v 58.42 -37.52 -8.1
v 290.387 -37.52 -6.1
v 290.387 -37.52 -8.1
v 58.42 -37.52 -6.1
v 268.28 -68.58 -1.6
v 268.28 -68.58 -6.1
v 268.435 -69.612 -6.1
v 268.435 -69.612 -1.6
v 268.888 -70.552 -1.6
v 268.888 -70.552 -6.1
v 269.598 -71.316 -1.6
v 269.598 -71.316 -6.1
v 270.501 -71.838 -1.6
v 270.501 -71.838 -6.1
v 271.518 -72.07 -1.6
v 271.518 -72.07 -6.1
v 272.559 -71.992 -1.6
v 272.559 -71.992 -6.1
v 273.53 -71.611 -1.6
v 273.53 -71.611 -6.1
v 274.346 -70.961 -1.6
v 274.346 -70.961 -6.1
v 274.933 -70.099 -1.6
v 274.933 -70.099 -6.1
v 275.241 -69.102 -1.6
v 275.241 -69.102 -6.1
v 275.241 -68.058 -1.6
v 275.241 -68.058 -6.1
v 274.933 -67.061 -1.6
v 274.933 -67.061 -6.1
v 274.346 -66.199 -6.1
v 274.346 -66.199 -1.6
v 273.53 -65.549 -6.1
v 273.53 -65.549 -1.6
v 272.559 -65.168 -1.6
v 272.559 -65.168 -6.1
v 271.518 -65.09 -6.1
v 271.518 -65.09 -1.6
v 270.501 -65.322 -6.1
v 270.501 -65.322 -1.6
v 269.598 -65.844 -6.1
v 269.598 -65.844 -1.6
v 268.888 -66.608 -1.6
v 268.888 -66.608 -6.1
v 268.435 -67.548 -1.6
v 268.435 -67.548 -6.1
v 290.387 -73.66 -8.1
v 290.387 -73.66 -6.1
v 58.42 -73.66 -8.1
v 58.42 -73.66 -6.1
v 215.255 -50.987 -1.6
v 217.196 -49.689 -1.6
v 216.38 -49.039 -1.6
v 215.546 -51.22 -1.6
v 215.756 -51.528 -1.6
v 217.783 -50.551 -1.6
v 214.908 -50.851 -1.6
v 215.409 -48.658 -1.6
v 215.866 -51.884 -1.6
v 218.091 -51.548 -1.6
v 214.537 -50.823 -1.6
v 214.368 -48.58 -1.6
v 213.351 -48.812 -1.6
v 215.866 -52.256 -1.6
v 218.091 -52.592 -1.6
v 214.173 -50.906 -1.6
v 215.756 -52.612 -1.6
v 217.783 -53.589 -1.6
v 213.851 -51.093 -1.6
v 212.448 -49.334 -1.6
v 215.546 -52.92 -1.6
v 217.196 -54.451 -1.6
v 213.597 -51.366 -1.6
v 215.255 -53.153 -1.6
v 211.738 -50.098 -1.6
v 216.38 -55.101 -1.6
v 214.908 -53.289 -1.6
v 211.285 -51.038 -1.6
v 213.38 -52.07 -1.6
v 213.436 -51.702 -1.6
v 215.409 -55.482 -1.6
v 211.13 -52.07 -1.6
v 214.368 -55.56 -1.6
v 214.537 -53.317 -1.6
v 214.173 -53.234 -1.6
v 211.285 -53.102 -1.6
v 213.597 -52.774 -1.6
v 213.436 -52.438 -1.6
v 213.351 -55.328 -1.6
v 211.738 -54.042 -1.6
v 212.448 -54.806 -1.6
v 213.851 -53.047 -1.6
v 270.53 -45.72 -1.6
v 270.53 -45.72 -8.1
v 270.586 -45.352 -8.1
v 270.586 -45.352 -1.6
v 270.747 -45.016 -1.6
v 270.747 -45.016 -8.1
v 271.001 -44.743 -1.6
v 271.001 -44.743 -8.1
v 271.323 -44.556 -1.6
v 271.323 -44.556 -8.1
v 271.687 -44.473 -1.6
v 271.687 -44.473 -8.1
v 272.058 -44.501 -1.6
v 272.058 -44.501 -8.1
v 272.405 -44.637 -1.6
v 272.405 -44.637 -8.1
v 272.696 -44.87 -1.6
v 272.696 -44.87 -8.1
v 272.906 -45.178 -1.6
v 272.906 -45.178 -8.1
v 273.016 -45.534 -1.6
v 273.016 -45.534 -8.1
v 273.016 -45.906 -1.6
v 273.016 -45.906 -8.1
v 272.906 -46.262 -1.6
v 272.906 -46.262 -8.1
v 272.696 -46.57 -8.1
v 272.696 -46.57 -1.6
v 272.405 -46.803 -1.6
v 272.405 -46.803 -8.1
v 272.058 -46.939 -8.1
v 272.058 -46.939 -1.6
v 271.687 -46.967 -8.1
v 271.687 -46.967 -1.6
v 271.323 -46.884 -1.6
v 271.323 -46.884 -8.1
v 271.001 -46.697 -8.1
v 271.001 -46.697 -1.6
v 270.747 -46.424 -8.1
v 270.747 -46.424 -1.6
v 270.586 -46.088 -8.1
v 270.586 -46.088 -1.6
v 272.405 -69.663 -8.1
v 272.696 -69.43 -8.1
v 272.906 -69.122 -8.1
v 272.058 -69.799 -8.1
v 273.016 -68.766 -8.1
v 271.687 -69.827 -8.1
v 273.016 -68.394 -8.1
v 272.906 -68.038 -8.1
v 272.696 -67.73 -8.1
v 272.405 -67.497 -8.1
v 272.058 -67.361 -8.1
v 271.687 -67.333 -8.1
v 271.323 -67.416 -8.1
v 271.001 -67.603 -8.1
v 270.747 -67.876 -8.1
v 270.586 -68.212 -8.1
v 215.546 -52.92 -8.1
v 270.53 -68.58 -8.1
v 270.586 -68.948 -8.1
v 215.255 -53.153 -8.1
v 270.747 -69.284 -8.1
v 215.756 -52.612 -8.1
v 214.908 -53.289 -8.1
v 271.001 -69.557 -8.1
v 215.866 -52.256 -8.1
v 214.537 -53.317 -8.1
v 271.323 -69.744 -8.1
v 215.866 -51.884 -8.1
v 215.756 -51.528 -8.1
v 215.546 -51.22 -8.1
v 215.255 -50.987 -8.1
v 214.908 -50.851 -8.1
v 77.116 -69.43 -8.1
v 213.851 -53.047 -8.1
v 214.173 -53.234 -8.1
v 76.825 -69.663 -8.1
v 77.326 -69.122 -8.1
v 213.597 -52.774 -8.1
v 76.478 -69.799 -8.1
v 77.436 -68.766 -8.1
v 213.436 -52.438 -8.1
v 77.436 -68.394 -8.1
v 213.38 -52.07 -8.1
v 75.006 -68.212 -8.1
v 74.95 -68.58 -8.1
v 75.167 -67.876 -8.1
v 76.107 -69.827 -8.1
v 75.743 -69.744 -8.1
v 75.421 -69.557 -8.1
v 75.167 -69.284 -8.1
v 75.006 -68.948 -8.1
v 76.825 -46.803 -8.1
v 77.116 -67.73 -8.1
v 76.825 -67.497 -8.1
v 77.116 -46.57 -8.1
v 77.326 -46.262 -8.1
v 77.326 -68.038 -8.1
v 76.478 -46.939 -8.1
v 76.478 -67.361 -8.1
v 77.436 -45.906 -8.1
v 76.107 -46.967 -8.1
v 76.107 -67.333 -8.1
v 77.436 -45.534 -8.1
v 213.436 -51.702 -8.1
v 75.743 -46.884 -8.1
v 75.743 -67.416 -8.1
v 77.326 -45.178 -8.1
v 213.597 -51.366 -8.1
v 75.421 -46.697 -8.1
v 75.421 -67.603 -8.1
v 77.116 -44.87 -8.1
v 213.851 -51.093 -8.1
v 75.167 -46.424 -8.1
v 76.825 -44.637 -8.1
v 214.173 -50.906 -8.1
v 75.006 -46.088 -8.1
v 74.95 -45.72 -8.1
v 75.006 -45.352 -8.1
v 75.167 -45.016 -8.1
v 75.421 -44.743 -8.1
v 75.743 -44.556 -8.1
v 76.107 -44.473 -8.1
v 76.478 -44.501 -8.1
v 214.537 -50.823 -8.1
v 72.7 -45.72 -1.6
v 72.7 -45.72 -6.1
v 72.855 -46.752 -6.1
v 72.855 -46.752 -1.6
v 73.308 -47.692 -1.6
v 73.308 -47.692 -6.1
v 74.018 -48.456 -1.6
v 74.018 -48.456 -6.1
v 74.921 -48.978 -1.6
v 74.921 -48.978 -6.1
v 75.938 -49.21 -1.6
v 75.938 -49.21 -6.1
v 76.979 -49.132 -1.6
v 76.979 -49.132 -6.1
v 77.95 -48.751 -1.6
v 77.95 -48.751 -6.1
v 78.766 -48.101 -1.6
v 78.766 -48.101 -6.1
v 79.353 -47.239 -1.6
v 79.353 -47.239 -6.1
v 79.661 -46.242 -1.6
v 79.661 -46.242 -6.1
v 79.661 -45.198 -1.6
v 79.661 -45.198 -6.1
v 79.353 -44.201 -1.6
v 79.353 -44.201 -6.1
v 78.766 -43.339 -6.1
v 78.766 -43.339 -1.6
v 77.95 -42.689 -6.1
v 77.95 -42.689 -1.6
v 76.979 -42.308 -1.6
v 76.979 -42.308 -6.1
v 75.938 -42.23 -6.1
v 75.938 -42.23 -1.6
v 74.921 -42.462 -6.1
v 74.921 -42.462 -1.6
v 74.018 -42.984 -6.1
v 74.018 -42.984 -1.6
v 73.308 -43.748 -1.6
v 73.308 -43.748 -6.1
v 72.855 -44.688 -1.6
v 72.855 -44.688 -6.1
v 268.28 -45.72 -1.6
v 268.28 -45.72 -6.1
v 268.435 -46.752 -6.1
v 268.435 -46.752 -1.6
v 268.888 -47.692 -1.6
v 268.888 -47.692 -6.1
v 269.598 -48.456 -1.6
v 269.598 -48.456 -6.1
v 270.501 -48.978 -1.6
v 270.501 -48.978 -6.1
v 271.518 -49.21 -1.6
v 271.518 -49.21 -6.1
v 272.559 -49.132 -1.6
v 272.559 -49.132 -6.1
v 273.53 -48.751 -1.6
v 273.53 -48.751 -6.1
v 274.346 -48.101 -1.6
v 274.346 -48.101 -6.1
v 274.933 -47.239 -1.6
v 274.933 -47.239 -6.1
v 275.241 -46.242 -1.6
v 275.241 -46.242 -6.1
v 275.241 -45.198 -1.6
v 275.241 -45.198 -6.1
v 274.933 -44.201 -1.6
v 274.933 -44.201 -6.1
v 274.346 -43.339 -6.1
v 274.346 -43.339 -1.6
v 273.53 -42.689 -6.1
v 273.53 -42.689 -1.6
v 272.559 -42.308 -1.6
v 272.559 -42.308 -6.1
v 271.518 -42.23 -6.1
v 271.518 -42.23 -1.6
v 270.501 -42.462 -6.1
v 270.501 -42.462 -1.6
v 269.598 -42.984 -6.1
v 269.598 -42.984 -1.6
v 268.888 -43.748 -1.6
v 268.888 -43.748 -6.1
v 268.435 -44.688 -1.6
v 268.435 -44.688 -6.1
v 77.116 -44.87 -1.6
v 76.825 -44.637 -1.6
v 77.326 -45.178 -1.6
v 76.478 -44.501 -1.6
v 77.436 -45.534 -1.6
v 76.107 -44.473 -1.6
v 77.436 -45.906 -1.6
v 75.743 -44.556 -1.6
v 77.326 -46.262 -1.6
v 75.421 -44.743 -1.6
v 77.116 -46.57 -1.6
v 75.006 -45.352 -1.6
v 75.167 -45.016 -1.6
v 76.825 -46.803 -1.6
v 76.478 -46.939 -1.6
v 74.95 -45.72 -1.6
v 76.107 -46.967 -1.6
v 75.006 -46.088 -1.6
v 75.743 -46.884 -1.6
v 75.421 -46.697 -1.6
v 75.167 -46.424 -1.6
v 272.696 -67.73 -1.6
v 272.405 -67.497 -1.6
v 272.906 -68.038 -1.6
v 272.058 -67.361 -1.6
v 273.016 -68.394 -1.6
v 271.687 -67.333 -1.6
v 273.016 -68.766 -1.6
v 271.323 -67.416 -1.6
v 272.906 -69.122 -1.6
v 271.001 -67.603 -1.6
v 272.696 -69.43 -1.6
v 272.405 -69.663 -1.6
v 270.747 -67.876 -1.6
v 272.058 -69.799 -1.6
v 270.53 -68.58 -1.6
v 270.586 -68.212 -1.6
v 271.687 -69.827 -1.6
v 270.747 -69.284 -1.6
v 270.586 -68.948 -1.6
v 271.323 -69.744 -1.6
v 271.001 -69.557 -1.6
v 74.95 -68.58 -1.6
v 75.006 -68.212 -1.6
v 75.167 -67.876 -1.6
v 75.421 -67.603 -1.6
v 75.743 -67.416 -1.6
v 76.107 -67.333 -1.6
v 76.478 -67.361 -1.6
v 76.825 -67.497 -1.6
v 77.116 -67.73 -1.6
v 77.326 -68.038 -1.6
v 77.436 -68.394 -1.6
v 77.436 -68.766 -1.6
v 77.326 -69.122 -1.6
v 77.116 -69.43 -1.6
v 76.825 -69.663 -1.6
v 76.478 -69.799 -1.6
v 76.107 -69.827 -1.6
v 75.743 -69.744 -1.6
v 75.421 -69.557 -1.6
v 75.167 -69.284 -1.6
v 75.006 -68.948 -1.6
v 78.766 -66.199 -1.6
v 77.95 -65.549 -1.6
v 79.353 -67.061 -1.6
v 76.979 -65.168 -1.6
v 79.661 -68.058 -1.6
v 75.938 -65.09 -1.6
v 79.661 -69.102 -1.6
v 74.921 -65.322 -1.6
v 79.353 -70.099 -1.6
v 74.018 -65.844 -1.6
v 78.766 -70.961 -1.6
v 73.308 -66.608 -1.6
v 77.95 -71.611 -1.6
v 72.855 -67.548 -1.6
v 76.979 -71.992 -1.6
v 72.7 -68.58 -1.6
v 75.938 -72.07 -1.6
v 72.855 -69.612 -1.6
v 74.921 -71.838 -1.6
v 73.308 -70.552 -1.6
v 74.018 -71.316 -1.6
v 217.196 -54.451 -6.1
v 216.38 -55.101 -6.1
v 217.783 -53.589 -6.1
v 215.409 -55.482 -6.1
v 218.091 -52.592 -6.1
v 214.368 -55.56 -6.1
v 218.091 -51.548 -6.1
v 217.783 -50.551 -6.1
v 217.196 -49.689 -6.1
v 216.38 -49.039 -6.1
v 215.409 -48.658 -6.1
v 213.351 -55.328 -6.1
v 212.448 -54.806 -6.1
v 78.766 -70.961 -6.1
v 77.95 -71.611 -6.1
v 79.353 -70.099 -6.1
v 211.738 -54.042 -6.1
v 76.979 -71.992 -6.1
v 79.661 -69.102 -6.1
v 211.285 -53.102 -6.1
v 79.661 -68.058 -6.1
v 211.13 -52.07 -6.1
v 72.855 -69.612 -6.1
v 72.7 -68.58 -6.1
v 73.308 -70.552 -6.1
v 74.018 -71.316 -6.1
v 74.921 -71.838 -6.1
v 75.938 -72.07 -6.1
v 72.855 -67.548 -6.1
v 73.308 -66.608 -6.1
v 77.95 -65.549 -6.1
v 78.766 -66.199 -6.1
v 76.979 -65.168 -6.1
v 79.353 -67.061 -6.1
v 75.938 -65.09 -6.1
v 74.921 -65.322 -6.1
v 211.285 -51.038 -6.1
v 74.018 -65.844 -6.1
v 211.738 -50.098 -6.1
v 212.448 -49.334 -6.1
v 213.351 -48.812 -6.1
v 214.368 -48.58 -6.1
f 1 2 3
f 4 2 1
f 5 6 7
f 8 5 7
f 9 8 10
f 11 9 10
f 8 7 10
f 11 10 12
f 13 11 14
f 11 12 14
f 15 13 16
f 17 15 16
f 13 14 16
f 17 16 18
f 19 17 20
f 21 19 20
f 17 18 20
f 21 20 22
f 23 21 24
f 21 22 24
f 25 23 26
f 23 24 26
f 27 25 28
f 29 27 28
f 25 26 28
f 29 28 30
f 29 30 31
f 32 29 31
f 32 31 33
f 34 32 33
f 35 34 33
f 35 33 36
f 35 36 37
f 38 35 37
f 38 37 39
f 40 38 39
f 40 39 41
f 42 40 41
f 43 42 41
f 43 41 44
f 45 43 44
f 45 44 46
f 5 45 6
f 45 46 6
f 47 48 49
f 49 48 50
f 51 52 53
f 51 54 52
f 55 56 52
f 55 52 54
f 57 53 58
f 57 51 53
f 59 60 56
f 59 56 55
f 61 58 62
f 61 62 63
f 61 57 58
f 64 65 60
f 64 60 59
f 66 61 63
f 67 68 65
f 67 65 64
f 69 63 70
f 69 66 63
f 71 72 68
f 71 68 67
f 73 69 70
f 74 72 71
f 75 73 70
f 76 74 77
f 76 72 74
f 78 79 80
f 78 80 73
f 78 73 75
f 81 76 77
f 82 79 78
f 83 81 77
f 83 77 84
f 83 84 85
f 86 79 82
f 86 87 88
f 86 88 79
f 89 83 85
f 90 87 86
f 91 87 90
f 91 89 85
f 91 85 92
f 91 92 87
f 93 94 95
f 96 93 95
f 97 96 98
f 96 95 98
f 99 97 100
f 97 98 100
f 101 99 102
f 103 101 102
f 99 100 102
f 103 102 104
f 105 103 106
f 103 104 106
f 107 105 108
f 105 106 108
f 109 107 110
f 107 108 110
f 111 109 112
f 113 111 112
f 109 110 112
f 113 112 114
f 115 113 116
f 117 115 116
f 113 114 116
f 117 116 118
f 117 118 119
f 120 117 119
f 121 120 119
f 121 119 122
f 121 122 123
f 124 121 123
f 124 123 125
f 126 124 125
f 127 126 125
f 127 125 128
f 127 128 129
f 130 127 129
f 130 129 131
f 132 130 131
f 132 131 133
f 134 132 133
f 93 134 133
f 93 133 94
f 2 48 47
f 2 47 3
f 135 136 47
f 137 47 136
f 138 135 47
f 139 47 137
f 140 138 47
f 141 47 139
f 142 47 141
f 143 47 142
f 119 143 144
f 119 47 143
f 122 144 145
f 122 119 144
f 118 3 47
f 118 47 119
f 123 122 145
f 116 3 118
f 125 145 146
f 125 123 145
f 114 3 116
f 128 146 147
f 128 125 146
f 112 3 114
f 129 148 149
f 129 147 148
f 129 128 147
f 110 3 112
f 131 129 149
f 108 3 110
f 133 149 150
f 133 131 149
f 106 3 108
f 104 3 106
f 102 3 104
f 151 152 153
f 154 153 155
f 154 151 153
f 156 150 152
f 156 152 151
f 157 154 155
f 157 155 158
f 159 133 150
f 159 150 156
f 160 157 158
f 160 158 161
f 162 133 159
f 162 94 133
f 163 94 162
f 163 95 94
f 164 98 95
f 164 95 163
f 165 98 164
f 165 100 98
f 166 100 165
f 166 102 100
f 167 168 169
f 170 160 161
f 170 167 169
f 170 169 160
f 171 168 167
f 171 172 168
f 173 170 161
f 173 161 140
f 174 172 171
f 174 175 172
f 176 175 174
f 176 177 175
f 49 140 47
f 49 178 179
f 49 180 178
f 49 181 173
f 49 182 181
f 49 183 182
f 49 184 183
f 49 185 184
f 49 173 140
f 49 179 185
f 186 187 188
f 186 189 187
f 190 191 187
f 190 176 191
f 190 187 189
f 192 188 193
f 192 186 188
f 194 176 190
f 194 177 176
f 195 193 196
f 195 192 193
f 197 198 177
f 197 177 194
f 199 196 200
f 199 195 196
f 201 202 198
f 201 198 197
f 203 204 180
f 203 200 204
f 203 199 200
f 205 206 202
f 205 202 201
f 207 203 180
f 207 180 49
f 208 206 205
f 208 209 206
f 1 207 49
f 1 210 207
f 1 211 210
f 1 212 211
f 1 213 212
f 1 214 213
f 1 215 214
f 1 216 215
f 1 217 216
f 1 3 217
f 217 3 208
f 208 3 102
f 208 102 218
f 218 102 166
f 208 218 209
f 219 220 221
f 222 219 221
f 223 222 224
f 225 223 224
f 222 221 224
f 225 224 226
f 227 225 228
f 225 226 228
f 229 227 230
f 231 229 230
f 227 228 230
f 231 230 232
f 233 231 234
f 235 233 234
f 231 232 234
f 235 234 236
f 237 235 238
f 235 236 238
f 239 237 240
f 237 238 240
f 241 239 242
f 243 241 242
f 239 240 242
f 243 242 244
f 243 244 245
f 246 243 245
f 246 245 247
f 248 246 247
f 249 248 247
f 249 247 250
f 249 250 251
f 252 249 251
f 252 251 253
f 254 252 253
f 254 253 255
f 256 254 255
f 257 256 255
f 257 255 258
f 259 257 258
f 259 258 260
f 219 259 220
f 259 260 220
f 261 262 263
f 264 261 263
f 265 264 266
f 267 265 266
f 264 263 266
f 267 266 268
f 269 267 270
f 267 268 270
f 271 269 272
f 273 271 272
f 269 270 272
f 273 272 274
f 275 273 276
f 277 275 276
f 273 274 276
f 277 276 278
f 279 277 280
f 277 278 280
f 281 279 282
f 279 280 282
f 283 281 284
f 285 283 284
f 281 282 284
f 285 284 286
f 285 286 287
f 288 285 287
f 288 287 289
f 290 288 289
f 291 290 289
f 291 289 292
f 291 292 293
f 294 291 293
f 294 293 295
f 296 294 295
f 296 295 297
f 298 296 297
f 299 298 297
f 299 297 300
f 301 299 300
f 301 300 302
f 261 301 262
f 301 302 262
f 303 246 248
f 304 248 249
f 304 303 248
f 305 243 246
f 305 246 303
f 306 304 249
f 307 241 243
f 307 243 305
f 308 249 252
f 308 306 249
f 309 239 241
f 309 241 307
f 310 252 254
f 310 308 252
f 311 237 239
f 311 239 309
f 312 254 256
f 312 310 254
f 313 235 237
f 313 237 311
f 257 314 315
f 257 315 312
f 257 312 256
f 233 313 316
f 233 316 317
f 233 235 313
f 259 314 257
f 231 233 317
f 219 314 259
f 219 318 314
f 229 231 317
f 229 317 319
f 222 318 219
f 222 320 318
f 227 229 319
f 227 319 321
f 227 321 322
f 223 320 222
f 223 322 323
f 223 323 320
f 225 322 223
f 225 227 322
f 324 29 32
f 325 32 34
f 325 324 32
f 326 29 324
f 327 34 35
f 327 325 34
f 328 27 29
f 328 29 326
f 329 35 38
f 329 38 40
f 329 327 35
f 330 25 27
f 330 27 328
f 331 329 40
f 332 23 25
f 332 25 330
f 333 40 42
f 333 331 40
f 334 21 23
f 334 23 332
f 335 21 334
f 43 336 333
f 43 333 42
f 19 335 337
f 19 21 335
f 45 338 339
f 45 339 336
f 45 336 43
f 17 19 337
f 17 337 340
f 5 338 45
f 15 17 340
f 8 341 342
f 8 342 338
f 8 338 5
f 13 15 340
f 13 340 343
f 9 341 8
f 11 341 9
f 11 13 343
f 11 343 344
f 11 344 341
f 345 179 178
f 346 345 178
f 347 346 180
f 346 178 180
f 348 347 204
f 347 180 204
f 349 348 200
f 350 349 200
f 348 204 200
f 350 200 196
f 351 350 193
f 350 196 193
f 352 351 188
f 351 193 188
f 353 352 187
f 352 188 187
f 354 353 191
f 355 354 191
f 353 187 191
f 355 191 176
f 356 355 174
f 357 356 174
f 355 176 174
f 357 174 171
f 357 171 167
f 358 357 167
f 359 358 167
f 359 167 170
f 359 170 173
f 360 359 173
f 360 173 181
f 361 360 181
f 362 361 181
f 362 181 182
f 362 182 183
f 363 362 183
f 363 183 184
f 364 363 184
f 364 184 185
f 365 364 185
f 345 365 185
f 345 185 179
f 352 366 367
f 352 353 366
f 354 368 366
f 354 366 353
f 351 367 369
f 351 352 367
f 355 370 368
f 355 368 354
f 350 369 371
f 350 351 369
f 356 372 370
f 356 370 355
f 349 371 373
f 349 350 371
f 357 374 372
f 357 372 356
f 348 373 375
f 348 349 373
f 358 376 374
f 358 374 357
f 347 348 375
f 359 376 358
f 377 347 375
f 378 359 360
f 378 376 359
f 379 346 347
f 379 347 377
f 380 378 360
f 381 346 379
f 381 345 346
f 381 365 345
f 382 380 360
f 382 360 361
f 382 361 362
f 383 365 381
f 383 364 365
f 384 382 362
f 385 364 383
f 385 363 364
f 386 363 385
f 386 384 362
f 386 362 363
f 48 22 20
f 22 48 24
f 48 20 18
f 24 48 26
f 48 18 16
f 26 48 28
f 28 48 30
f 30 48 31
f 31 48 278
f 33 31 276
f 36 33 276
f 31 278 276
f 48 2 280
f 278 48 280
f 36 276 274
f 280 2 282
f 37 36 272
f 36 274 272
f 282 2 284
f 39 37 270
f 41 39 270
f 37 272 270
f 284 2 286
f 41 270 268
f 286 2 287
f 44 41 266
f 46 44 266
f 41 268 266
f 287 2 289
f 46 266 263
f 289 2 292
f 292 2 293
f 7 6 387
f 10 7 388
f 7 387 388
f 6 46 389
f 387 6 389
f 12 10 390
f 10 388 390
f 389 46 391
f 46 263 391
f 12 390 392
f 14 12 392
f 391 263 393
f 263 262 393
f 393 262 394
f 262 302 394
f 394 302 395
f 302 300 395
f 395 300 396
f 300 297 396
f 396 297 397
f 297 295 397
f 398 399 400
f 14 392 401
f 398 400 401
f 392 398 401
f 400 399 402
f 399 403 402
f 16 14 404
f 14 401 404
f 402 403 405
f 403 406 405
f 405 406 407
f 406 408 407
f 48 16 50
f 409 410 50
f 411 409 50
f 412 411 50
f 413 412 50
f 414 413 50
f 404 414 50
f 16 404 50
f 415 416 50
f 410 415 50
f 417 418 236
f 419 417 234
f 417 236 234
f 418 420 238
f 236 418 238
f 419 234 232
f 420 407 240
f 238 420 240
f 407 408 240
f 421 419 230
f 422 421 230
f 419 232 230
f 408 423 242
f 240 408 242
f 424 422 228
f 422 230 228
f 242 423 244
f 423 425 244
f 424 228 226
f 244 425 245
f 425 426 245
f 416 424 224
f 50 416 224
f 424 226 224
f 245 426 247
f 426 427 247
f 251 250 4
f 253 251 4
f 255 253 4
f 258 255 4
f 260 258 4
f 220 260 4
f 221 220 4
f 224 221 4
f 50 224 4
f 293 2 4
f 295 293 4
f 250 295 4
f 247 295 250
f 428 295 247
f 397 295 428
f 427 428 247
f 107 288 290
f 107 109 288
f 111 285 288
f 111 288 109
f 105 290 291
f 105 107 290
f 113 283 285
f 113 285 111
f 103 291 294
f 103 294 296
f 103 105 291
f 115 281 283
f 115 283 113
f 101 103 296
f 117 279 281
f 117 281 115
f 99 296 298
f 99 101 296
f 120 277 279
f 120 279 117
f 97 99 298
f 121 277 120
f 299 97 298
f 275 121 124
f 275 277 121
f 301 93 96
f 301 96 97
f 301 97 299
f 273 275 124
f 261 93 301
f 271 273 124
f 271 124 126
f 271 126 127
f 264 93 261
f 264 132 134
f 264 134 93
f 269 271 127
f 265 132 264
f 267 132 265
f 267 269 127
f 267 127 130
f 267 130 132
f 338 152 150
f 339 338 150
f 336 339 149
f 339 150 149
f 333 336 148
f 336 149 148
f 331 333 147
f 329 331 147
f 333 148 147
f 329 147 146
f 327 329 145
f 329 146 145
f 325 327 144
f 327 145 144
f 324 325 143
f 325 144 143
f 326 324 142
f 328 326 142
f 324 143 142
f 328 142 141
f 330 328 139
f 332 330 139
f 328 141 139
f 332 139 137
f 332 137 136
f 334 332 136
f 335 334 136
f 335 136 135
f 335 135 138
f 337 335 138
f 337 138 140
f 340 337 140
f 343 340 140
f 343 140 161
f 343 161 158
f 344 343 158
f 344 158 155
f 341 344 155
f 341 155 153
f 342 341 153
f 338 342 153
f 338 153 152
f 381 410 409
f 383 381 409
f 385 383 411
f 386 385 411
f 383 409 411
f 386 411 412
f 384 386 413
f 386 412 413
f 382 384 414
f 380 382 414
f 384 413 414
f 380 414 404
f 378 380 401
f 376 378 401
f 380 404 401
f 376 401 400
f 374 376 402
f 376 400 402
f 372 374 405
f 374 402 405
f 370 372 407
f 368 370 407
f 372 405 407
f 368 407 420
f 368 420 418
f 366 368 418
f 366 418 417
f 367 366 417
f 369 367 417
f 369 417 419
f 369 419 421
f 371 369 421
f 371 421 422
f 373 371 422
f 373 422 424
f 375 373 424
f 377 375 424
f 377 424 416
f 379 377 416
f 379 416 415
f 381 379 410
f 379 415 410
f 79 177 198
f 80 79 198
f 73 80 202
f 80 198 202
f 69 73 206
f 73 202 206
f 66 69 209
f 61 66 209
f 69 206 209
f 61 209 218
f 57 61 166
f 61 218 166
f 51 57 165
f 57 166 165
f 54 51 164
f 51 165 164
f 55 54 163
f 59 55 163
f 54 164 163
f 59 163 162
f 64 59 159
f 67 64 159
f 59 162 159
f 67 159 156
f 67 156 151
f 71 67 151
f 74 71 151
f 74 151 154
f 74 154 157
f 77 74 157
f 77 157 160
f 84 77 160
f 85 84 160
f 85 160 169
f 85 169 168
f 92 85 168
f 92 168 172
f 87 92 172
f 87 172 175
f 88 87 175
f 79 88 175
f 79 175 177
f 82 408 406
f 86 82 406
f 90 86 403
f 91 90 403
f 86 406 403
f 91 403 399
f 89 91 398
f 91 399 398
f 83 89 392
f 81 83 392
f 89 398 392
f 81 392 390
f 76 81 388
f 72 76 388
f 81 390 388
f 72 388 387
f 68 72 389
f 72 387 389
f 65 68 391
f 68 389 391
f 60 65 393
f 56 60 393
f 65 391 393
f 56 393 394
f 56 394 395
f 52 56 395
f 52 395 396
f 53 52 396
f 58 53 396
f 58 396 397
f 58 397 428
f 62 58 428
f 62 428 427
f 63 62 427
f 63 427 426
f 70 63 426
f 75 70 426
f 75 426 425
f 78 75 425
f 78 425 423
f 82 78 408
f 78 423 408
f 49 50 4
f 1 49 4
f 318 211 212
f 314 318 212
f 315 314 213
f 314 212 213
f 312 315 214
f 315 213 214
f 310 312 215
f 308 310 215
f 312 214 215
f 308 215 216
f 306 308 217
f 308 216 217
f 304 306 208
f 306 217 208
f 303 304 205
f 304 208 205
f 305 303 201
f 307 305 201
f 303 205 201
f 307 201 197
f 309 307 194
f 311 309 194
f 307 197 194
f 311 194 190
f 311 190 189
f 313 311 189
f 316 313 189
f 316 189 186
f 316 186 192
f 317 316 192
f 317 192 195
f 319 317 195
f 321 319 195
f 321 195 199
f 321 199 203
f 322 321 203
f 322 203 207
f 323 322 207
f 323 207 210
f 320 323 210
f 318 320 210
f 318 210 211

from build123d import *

# Parameters (mm, degrees)
BOSS_EXTRUDE1_START         = 4.5
SKETCH2_W                   = 231.966777064
SKETCH2_H                   = 36.14
BOSS_EXTRUDE1_DEPTH         = 2
SKETCH3_R                   = 3.5
BOSS_EXTRUDE2_DEPTH         = 4.5
TAP_DRILL_FOR_M3X0_5_TAP1_D = 2.5


with BuildPart() as part:
    # Sketch2 → Boss-Extrude1 (new body)
    with BuildSketch(Plane(origin=(0, 0, -1.6), x_dir=(-1, 0, 0), z_dir=(0, 0, -1)).offset(BOSS_EXTRUDE1_START)):
        with Locations((-174.403388532, -55.59)):
            Rectangle(SKETCH2_W, SKETCH2_H)
    extrude(amount=BOSS_EXTRUDE1_DEPTH)

    # Sketch3 → Boss-Extrude2 (add)
    with BuildSketch(Plane.XY.offset(-6.1)):
        with Locations(Location((271.78, -45.72, 0), (0, 0, 180))):
            Circle(SKETCH3_R)
        with Locations(Location((271.78, -68.58, 0), (0, 0, 180))):
            Circle(SKETCH3_R)
        with Locations(Location((214.63, -52.07, 0), (0, 0, 180))):
            Circle(SKETCH3_R)
        with Locations(Location((76.2, -45.72, 0), (0, 0, 180))):
            Circle(SKETCH3_R)
        with Locations(Location((76.2, -68.58, 0), (0, 0, 180))):
            Circle(SKETCH3_R)
    extrude(amount=BOSS_EXTRUDE2_DEPTH)

    # Tap Drill for M3x0.5 Tap1 (through all)
    with Locations(Plane.XY.offset(-1.6)):
        with Locations((271.78, -45.72), (271.78, -68.58), (214.63, -52.07), (76.2, -45.72), (76.2, -68.58)):
            Hole(TAP_DRILL_FOR_M3X0_5_TAP1_D / 2)


solid = part.part
